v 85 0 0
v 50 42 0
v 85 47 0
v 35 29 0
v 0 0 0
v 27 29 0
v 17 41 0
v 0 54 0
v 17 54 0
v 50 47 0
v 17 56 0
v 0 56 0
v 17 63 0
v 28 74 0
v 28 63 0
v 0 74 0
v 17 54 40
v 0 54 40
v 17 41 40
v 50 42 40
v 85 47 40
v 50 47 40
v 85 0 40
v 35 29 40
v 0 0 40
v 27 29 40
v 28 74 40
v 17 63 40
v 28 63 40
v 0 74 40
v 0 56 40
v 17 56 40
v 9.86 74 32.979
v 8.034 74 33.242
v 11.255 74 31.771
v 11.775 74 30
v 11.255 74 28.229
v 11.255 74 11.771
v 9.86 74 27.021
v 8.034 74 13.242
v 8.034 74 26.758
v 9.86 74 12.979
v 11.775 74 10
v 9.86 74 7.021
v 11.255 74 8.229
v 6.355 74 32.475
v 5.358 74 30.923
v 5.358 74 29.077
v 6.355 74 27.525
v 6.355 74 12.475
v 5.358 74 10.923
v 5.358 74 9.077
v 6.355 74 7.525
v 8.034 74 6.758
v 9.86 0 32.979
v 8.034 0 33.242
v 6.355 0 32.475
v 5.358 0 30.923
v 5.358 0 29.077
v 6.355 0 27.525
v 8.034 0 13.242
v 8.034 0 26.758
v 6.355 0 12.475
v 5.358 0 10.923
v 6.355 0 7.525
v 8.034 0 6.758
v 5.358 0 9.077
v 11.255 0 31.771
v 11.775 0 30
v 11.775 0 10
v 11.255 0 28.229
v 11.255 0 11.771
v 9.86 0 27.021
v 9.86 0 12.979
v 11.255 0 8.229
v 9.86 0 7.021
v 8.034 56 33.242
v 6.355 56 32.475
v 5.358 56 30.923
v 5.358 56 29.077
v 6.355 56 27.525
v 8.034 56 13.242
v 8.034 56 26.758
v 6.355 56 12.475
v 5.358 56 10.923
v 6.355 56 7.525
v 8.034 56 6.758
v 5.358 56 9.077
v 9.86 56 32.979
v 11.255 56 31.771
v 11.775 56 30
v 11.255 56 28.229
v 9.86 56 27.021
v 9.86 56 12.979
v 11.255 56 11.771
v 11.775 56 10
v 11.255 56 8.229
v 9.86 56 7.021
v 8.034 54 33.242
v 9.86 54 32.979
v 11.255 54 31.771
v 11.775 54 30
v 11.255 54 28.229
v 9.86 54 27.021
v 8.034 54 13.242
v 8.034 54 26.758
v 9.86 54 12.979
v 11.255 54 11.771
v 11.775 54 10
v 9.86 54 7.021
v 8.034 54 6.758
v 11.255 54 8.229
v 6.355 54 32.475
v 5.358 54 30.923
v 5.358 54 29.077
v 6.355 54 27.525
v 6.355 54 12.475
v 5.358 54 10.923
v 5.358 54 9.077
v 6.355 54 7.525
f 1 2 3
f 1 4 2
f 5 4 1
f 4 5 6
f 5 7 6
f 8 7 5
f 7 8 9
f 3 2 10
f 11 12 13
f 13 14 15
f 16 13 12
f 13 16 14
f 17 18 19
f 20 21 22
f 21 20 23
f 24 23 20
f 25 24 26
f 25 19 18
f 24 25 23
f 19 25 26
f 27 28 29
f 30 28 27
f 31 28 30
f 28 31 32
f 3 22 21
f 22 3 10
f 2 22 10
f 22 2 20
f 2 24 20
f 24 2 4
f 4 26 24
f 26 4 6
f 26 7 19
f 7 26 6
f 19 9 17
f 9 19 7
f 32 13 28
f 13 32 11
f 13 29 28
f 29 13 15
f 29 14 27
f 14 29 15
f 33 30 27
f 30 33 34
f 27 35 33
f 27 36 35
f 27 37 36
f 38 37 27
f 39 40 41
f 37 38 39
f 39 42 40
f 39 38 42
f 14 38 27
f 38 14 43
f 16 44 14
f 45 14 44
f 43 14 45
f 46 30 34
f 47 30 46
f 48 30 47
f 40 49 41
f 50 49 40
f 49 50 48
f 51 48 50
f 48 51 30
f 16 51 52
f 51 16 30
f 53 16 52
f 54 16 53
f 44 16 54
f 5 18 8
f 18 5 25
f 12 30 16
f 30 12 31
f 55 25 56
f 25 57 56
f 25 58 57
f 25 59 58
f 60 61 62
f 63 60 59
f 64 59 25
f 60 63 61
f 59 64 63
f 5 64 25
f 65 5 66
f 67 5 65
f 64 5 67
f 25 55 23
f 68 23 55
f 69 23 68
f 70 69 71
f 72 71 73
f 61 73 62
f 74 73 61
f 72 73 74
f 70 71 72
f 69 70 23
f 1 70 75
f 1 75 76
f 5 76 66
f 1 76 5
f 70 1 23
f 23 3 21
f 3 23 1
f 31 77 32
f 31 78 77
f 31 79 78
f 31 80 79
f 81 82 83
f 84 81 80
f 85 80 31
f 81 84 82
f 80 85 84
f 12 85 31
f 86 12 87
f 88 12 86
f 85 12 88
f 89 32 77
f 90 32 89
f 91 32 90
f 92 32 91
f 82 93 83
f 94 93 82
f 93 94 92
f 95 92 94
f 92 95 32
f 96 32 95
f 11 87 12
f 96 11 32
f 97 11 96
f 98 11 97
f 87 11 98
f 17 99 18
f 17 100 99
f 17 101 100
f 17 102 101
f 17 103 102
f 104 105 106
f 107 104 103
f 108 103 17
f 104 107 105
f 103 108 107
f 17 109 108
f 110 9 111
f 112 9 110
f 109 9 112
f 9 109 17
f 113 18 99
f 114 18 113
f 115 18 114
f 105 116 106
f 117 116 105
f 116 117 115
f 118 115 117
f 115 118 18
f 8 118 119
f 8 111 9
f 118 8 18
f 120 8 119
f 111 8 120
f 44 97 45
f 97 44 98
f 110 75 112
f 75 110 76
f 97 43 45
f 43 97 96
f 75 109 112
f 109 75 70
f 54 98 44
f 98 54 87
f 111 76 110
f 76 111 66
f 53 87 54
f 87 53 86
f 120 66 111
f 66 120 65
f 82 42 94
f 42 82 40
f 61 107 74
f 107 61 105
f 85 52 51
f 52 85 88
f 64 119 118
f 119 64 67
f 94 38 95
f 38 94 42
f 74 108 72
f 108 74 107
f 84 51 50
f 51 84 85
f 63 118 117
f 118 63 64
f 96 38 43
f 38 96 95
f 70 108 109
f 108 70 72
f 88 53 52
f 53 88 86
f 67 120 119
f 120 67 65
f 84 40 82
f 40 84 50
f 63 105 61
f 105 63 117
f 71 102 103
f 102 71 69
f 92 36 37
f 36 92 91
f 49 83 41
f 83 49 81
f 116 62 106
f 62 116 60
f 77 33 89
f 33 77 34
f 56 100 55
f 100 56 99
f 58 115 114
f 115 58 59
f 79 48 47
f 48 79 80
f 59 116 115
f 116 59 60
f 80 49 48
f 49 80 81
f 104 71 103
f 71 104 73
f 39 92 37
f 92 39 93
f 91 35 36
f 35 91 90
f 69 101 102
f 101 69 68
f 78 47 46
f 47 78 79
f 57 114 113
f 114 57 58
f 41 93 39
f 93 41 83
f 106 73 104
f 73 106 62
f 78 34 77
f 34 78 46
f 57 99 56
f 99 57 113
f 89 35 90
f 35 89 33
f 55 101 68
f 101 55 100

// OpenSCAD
difference() {
    linear_extrude( height=40 )
        polygon( points=[ [0,0], 
                        [85,0], 
                        [85,47],
                        [50, 47],
                        [50, 42],
                        [35, 29],
                        [27, 29],
                        [17, 41], 
                        [17, 63],
                        [28, 63],
                        [28, 74],
                        [0, 74] ] );
    // to create complete:
    translate([-0.1, 54, -0.1])
        cube([18, 2, 41]);
    // to create top:
    //translate([-0.1, 54, -0.1])
    //    cube([50, 24, 41]);
    //to create bottom:
    //translate([-0.1, -0.1, -0.1])
    //    cube([86, 54, 41]);
    
    
    dia = 6.35 + 0.2;
    center = 17.0 / 2;
    depth = 86;
    translate([center, -0.1, 10])
        rotate([-90, 0, 0])
            cylinder(d=dia, h=depth);
    translate([center, -0.1, 30])
        rotate([-90, 0, 0])
            cylinder(d=dia, h=depth);
}
